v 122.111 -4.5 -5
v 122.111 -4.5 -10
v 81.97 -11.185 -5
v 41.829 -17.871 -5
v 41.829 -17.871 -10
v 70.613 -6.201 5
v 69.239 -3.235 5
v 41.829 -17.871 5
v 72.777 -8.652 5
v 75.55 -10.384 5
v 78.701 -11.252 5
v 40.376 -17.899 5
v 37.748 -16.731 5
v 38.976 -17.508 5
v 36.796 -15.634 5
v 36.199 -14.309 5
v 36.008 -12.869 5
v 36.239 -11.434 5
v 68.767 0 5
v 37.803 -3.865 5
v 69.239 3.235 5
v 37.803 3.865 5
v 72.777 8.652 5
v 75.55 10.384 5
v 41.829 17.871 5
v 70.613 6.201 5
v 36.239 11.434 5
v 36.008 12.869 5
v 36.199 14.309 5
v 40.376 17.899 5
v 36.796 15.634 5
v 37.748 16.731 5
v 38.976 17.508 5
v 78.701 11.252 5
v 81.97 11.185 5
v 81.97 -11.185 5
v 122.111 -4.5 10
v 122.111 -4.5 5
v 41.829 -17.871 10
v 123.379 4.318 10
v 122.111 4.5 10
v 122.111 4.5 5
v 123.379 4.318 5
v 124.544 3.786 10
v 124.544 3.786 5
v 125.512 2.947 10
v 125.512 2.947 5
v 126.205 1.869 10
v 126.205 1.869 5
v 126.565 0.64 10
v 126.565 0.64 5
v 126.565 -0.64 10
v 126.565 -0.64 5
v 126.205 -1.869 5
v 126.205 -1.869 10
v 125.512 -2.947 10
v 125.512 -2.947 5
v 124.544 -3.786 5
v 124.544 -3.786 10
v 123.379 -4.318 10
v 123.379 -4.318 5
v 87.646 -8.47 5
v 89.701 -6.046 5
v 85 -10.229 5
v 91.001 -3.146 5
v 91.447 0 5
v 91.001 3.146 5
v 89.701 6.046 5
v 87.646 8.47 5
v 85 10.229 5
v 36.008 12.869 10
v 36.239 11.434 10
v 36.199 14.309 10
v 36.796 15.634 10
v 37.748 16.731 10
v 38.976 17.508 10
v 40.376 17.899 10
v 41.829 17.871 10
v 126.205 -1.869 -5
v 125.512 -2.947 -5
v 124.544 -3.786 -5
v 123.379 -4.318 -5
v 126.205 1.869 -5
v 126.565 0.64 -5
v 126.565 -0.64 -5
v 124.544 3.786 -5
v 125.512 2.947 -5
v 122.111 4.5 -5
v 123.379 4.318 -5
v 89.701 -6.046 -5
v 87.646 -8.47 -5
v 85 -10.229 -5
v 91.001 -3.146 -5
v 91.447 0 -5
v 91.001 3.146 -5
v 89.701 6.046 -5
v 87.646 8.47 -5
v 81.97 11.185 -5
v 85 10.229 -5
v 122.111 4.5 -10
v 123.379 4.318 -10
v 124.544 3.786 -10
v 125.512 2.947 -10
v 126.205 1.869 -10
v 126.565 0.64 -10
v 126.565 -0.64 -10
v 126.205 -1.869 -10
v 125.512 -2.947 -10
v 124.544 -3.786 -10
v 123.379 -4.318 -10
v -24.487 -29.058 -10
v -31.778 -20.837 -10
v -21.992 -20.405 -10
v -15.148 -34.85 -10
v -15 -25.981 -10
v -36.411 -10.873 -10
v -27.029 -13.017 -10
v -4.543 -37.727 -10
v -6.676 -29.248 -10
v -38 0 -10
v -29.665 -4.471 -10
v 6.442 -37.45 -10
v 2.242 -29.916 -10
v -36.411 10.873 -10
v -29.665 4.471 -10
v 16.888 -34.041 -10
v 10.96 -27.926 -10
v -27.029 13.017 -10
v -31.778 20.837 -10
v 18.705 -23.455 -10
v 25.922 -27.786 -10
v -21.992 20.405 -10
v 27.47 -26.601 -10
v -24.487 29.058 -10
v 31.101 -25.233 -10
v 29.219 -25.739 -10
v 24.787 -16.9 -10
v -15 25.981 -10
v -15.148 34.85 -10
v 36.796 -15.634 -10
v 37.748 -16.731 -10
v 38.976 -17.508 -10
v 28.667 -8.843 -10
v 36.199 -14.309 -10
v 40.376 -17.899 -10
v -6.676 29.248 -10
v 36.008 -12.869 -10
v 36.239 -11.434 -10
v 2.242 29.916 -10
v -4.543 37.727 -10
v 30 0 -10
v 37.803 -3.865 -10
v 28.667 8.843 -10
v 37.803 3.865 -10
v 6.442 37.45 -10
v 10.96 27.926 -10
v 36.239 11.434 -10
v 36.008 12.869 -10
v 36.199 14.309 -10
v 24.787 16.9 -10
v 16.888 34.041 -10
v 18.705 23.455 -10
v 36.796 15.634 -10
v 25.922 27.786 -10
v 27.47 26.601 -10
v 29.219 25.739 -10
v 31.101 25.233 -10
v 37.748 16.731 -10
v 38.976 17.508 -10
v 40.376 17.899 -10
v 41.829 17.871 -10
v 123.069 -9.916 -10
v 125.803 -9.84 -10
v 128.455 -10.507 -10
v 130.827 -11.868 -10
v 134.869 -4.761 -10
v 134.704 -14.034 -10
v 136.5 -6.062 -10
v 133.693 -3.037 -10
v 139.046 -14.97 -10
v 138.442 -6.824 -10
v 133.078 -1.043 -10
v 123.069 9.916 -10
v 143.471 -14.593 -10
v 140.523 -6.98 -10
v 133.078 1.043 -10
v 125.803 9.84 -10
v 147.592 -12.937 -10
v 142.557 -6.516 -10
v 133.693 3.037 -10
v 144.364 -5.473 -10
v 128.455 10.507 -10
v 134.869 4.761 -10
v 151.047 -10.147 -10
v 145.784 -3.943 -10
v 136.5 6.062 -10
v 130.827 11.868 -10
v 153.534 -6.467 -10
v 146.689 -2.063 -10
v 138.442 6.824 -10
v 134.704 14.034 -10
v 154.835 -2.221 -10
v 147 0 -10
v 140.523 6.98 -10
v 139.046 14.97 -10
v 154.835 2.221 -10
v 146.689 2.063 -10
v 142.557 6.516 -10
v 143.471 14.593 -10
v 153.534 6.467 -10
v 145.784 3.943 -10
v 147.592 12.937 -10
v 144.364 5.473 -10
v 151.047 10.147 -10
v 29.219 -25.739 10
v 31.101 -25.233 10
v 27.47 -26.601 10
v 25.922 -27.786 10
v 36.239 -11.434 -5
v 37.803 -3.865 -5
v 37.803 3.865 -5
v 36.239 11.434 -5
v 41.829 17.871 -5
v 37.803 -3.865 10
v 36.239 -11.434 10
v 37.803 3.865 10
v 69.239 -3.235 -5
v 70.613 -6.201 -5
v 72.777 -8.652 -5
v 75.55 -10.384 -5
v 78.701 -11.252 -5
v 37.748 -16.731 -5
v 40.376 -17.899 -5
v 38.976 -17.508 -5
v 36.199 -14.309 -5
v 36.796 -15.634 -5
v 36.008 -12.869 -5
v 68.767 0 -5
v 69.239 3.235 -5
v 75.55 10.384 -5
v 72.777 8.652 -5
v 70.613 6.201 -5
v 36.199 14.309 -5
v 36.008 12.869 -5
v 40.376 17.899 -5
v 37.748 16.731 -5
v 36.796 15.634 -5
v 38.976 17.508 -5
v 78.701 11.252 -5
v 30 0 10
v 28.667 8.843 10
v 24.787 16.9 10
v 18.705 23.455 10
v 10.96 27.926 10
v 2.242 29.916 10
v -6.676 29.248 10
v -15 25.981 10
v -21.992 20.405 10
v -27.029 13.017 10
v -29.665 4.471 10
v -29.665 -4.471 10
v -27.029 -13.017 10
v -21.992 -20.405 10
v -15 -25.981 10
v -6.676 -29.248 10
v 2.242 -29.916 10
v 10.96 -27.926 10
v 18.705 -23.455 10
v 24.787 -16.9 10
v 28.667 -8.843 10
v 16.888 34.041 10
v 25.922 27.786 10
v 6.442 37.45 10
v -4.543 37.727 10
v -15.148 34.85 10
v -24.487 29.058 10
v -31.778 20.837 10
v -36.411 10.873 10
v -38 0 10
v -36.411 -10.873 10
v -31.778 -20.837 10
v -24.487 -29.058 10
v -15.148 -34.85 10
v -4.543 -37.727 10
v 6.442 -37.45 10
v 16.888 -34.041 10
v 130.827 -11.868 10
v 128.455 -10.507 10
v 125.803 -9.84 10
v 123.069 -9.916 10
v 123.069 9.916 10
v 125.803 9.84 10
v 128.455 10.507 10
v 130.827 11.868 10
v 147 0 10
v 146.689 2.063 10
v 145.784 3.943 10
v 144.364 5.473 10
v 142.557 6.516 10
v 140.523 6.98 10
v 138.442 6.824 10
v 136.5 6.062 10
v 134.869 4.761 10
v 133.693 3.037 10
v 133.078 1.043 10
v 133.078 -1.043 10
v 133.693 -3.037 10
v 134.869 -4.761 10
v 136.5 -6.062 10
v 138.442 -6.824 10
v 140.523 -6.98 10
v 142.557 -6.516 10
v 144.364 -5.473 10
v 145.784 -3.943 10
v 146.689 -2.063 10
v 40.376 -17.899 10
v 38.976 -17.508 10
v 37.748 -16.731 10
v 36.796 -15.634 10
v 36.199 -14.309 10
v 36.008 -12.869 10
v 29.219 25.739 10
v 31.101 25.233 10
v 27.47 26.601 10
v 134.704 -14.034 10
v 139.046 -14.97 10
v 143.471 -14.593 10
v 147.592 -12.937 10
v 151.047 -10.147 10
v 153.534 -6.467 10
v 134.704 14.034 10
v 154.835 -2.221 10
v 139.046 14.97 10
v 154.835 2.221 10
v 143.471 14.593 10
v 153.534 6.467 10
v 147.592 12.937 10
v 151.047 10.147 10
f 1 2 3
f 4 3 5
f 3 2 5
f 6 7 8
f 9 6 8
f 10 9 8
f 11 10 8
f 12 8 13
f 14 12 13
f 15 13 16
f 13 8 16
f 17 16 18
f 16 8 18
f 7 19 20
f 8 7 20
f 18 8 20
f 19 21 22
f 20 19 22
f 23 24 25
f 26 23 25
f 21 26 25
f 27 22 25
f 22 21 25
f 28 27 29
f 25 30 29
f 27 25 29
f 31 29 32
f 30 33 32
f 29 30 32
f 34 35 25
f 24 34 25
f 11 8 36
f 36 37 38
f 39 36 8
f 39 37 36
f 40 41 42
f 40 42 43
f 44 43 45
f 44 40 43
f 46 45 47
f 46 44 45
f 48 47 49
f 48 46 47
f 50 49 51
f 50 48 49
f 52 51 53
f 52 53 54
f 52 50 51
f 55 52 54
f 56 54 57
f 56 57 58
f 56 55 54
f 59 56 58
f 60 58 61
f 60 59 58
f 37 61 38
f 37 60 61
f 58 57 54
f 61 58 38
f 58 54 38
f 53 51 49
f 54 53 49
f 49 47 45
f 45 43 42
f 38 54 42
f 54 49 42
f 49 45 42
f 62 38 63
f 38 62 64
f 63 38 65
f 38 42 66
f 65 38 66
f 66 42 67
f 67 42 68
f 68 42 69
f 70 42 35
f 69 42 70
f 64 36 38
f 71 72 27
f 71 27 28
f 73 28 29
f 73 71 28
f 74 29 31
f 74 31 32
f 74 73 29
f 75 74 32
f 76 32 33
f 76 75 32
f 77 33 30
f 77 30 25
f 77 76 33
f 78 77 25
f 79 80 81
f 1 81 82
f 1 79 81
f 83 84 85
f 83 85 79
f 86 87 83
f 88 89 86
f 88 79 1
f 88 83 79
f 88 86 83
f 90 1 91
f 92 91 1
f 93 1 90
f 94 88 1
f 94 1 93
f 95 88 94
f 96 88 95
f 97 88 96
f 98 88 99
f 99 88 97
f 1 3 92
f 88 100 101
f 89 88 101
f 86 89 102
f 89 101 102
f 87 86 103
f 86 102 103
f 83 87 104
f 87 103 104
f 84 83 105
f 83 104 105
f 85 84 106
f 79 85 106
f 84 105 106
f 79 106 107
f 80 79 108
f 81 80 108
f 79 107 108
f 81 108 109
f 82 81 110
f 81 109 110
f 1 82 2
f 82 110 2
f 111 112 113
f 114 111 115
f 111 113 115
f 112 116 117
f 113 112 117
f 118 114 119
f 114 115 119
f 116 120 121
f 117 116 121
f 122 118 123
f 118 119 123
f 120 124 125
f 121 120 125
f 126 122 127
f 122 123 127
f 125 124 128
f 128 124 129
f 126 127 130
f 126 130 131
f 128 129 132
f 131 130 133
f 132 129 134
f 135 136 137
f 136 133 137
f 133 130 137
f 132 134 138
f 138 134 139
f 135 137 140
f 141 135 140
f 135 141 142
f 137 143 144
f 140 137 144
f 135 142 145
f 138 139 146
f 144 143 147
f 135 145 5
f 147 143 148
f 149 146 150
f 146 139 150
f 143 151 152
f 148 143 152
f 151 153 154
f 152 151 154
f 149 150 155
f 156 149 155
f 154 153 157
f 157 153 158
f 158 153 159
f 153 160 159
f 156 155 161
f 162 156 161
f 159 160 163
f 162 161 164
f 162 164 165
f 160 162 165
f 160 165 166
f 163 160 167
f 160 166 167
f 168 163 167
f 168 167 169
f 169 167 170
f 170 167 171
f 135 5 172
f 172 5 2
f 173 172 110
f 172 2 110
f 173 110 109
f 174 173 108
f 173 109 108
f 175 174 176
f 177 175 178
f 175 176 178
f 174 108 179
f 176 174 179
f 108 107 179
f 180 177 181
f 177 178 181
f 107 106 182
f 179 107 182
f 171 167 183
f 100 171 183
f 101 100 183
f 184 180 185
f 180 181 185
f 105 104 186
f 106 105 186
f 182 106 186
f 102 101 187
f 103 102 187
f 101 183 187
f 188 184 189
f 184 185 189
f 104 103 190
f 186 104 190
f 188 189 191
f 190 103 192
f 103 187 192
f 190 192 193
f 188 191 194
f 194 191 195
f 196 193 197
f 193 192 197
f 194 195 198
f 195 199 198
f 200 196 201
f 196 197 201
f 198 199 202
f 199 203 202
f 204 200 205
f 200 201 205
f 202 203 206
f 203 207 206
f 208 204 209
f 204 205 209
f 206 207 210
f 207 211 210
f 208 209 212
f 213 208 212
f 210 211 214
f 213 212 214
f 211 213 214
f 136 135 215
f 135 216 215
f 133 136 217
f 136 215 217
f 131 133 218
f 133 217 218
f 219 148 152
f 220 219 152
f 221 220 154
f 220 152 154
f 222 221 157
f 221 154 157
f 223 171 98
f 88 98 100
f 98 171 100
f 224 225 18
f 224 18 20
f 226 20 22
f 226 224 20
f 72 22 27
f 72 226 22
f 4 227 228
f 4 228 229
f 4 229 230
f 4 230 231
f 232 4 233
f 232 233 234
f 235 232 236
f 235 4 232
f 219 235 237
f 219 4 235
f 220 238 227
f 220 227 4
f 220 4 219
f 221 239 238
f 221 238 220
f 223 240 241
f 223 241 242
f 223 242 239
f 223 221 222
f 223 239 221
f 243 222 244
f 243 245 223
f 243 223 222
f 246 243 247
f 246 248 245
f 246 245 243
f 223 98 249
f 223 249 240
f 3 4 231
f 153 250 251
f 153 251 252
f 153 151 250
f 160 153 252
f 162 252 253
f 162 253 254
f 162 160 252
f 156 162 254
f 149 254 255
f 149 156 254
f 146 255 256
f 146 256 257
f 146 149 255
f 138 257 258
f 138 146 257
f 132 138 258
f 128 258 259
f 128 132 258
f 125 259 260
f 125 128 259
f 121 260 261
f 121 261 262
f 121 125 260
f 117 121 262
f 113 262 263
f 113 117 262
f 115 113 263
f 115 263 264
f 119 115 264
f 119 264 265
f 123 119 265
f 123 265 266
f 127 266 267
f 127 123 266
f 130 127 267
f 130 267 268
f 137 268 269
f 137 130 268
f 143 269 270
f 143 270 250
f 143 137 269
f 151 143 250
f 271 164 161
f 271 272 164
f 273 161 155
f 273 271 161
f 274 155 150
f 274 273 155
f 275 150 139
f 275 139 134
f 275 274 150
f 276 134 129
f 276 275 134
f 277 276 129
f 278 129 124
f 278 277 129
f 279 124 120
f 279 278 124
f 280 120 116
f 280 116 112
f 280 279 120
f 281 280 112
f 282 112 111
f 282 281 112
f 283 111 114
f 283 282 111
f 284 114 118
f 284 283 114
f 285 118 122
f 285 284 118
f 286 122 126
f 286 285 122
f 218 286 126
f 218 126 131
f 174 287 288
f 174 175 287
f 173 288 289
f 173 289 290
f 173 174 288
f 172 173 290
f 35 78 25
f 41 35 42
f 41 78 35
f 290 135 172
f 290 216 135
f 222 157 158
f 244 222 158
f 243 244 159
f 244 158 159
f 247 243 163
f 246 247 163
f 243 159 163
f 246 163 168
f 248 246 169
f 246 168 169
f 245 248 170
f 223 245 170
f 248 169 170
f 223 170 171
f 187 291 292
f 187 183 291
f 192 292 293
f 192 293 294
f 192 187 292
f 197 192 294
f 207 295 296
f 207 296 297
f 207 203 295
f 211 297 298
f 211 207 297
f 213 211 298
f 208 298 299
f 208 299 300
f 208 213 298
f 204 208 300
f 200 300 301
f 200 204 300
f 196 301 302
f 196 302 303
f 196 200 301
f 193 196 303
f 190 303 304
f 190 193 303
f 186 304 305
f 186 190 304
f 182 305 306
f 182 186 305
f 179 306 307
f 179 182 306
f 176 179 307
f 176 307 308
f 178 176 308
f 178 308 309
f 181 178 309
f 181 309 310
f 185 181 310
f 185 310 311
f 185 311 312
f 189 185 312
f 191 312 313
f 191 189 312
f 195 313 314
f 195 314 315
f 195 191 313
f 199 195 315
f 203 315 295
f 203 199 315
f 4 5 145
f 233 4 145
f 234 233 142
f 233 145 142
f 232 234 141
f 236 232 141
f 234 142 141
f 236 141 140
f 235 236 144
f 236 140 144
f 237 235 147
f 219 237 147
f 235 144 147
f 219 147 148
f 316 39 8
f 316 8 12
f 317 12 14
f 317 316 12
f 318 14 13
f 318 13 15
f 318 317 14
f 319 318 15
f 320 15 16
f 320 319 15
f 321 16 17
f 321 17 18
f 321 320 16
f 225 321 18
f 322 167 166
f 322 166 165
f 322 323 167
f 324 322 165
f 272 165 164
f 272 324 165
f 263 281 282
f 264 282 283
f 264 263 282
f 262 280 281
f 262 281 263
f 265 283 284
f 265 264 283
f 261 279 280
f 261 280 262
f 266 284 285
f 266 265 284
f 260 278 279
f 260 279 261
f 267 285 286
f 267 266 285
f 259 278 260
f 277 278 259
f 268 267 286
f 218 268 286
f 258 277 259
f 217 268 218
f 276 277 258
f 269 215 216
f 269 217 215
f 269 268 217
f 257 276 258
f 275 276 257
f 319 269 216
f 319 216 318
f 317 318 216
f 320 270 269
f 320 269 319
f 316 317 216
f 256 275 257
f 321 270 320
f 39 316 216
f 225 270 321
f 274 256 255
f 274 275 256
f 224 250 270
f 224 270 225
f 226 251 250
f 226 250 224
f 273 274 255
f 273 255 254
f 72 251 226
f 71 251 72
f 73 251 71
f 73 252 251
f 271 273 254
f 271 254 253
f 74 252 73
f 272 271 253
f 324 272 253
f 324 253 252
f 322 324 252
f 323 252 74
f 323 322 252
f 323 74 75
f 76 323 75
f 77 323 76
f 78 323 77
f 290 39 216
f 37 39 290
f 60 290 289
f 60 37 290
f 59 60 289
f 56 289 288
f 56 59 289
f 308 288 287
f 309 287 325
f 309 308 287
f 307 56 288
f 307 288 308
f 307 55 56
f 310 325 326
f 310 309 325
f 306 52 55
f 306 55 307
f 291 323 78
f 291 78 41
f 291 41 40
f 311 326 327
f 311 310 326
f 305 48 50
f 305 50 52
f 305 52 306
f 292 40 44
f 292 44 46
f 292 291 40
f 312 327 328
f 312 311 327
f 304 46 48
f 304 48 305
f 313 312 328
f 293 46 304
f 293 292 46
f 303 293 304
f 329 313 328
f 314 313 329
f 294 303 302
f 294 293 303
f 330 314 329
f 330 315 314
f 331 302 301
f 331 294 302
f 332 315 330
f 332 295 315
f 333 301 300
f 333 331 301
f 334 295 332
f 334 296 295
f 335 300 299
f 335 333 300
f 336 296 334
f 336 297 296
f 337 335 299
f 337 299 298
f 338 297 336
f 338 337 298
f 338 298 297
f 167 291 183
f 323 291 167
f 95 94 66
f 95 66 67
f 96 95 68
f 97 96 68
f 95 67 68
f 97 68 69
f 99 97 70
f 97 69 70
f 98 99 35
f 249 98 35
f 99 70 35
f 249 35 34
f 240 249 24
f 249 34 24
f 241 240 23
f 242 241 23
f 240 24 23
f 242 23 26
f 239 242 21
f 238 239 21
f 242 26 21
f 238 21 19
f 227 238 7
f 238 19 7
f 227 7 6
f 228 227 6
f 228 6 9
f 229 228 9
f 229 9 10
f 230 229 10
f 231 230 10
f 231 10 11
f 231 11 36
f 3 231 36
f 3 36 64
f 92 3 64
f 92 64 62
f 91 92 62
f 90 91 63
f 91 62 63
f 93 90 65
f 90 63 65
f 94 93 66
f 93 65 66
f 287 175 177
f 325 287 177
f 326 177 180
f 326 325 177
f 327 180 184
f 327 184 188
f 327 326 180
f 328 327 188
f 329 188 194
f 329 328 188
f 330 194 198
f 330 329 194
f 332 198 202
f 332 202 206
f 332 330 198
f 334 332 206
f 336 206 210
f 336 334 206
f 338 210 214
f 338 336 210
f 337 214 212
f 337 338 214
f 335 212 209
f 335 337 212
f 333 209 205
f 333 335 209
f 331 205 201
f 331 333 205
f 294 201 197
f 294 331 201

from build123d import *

# Parameters (mm, degrees)
SKETCH1_R           = 30
SKETCH1_R_2         = 7
BOSS_EXTRUDE1_DEPTH = 10
FILLET1_R           = 10
FILLET3_R           = 10
CUT_EXTRUDE1_DEPTH  = 5
CUT_EXTRUDE3_START  = 10
SKETCH12_R          = 11.339564337
CUT_EXTRUDE3_DEPTH  = 21


with BuildPart() as part:
    # Sketch1 → Boss-Extrude1 (new body, symmetric)
    with BuildSketch(Plane.XY):
        with BuildLine():
            Line((128.063755469, 9.084385863), (27.935473676, 25.760615491))
            ThreePointArc((27.935473676, 25.760615491), (-38, 0), (27.935473676, -25.760615491))
            Line((27.935473676, -25.760615491), (128.063755469, -9.084385863))
            ThreePointArc((128.063755469, -9.084385863), (155, 0), (128.063755469, 9.084385863))
        make_face()
        Circle(SKETCH1_R, mode=Mode.SUBTRACT)
        with Locations((140, 0)):
            Circle(SKETCH1_R_2, mode=Mode.SUBTRACT)
    extrude(amount=BOSS_EXTRUDE1_DEPTH, both=True)

    # Fillet1
    fillet1_edges = [part.edges().sort_by_distance(p)[0] for p in [
        (27.935473676, -25.760615491, 0),
        (27.935473676, 25.760615491, 0),
    ]]
    fillet(fillet1_edges, radius=FILLET1_R)

    # Fillet3
    fillet3_edges = [part.edges().sort_by_distance(p)[0] for p in [
        (128.063755469, -9.084385863, 0),
        (128.063755469, 9.084385863, 0),
    ]]
    fillet(fillet3_edges, radius=FILLET3_R)

    # Sketch2 → Cut-Extrude1 (cut)
    with BuildSketch(Plane.XY.offset(10)):
        with BuildLine():
            Line((41.828554558, 17.870982725), (122.111301675, 4.5))
            ThreePointArc((122.111301675, 4.5), (126.611301675, 0), (122.111301675, -4.5))
            Line((122.111301675, -4.5), (41.828554558, -17.870982725))
            ThreePointArc((41.828554558, -17.870982725), (37.231968897, -16.217361812), (36.238855523, -11.43439331))
            ThreePointArc((36.238855523, -11.43439331), (38, 0), (36.238855523, 11.43439331))
            ThreePointArc((36.238855523, 11.43439331), (37.231968897, 16.217361812), (41.828554558, 17.870982725))
        make_face()
    cut_extrude1 = extrude(amount=-CUT_EXTRUDE1_DEPTH, mode=Mode.SUBTRACT)

    # Mirror1: Cut-Extrude1 across plane
    add(cut_extrude1.mirror(Plane.XY), mode=Mode.SUBTRACT)

    # Sketch12 → Cut-Extrude3 (cut, through all)
    with BuildSketch(Plane.XY.offset(CUT_EXTRUDE3_START)):
        with Locations((80.10699969, 0)):
            Circle(SKETCH12_R)
    extrude(amount=-CUT_EXTRUDE3_DEPTH, mode=Mode.SUBTRACT)


solid = part.part
